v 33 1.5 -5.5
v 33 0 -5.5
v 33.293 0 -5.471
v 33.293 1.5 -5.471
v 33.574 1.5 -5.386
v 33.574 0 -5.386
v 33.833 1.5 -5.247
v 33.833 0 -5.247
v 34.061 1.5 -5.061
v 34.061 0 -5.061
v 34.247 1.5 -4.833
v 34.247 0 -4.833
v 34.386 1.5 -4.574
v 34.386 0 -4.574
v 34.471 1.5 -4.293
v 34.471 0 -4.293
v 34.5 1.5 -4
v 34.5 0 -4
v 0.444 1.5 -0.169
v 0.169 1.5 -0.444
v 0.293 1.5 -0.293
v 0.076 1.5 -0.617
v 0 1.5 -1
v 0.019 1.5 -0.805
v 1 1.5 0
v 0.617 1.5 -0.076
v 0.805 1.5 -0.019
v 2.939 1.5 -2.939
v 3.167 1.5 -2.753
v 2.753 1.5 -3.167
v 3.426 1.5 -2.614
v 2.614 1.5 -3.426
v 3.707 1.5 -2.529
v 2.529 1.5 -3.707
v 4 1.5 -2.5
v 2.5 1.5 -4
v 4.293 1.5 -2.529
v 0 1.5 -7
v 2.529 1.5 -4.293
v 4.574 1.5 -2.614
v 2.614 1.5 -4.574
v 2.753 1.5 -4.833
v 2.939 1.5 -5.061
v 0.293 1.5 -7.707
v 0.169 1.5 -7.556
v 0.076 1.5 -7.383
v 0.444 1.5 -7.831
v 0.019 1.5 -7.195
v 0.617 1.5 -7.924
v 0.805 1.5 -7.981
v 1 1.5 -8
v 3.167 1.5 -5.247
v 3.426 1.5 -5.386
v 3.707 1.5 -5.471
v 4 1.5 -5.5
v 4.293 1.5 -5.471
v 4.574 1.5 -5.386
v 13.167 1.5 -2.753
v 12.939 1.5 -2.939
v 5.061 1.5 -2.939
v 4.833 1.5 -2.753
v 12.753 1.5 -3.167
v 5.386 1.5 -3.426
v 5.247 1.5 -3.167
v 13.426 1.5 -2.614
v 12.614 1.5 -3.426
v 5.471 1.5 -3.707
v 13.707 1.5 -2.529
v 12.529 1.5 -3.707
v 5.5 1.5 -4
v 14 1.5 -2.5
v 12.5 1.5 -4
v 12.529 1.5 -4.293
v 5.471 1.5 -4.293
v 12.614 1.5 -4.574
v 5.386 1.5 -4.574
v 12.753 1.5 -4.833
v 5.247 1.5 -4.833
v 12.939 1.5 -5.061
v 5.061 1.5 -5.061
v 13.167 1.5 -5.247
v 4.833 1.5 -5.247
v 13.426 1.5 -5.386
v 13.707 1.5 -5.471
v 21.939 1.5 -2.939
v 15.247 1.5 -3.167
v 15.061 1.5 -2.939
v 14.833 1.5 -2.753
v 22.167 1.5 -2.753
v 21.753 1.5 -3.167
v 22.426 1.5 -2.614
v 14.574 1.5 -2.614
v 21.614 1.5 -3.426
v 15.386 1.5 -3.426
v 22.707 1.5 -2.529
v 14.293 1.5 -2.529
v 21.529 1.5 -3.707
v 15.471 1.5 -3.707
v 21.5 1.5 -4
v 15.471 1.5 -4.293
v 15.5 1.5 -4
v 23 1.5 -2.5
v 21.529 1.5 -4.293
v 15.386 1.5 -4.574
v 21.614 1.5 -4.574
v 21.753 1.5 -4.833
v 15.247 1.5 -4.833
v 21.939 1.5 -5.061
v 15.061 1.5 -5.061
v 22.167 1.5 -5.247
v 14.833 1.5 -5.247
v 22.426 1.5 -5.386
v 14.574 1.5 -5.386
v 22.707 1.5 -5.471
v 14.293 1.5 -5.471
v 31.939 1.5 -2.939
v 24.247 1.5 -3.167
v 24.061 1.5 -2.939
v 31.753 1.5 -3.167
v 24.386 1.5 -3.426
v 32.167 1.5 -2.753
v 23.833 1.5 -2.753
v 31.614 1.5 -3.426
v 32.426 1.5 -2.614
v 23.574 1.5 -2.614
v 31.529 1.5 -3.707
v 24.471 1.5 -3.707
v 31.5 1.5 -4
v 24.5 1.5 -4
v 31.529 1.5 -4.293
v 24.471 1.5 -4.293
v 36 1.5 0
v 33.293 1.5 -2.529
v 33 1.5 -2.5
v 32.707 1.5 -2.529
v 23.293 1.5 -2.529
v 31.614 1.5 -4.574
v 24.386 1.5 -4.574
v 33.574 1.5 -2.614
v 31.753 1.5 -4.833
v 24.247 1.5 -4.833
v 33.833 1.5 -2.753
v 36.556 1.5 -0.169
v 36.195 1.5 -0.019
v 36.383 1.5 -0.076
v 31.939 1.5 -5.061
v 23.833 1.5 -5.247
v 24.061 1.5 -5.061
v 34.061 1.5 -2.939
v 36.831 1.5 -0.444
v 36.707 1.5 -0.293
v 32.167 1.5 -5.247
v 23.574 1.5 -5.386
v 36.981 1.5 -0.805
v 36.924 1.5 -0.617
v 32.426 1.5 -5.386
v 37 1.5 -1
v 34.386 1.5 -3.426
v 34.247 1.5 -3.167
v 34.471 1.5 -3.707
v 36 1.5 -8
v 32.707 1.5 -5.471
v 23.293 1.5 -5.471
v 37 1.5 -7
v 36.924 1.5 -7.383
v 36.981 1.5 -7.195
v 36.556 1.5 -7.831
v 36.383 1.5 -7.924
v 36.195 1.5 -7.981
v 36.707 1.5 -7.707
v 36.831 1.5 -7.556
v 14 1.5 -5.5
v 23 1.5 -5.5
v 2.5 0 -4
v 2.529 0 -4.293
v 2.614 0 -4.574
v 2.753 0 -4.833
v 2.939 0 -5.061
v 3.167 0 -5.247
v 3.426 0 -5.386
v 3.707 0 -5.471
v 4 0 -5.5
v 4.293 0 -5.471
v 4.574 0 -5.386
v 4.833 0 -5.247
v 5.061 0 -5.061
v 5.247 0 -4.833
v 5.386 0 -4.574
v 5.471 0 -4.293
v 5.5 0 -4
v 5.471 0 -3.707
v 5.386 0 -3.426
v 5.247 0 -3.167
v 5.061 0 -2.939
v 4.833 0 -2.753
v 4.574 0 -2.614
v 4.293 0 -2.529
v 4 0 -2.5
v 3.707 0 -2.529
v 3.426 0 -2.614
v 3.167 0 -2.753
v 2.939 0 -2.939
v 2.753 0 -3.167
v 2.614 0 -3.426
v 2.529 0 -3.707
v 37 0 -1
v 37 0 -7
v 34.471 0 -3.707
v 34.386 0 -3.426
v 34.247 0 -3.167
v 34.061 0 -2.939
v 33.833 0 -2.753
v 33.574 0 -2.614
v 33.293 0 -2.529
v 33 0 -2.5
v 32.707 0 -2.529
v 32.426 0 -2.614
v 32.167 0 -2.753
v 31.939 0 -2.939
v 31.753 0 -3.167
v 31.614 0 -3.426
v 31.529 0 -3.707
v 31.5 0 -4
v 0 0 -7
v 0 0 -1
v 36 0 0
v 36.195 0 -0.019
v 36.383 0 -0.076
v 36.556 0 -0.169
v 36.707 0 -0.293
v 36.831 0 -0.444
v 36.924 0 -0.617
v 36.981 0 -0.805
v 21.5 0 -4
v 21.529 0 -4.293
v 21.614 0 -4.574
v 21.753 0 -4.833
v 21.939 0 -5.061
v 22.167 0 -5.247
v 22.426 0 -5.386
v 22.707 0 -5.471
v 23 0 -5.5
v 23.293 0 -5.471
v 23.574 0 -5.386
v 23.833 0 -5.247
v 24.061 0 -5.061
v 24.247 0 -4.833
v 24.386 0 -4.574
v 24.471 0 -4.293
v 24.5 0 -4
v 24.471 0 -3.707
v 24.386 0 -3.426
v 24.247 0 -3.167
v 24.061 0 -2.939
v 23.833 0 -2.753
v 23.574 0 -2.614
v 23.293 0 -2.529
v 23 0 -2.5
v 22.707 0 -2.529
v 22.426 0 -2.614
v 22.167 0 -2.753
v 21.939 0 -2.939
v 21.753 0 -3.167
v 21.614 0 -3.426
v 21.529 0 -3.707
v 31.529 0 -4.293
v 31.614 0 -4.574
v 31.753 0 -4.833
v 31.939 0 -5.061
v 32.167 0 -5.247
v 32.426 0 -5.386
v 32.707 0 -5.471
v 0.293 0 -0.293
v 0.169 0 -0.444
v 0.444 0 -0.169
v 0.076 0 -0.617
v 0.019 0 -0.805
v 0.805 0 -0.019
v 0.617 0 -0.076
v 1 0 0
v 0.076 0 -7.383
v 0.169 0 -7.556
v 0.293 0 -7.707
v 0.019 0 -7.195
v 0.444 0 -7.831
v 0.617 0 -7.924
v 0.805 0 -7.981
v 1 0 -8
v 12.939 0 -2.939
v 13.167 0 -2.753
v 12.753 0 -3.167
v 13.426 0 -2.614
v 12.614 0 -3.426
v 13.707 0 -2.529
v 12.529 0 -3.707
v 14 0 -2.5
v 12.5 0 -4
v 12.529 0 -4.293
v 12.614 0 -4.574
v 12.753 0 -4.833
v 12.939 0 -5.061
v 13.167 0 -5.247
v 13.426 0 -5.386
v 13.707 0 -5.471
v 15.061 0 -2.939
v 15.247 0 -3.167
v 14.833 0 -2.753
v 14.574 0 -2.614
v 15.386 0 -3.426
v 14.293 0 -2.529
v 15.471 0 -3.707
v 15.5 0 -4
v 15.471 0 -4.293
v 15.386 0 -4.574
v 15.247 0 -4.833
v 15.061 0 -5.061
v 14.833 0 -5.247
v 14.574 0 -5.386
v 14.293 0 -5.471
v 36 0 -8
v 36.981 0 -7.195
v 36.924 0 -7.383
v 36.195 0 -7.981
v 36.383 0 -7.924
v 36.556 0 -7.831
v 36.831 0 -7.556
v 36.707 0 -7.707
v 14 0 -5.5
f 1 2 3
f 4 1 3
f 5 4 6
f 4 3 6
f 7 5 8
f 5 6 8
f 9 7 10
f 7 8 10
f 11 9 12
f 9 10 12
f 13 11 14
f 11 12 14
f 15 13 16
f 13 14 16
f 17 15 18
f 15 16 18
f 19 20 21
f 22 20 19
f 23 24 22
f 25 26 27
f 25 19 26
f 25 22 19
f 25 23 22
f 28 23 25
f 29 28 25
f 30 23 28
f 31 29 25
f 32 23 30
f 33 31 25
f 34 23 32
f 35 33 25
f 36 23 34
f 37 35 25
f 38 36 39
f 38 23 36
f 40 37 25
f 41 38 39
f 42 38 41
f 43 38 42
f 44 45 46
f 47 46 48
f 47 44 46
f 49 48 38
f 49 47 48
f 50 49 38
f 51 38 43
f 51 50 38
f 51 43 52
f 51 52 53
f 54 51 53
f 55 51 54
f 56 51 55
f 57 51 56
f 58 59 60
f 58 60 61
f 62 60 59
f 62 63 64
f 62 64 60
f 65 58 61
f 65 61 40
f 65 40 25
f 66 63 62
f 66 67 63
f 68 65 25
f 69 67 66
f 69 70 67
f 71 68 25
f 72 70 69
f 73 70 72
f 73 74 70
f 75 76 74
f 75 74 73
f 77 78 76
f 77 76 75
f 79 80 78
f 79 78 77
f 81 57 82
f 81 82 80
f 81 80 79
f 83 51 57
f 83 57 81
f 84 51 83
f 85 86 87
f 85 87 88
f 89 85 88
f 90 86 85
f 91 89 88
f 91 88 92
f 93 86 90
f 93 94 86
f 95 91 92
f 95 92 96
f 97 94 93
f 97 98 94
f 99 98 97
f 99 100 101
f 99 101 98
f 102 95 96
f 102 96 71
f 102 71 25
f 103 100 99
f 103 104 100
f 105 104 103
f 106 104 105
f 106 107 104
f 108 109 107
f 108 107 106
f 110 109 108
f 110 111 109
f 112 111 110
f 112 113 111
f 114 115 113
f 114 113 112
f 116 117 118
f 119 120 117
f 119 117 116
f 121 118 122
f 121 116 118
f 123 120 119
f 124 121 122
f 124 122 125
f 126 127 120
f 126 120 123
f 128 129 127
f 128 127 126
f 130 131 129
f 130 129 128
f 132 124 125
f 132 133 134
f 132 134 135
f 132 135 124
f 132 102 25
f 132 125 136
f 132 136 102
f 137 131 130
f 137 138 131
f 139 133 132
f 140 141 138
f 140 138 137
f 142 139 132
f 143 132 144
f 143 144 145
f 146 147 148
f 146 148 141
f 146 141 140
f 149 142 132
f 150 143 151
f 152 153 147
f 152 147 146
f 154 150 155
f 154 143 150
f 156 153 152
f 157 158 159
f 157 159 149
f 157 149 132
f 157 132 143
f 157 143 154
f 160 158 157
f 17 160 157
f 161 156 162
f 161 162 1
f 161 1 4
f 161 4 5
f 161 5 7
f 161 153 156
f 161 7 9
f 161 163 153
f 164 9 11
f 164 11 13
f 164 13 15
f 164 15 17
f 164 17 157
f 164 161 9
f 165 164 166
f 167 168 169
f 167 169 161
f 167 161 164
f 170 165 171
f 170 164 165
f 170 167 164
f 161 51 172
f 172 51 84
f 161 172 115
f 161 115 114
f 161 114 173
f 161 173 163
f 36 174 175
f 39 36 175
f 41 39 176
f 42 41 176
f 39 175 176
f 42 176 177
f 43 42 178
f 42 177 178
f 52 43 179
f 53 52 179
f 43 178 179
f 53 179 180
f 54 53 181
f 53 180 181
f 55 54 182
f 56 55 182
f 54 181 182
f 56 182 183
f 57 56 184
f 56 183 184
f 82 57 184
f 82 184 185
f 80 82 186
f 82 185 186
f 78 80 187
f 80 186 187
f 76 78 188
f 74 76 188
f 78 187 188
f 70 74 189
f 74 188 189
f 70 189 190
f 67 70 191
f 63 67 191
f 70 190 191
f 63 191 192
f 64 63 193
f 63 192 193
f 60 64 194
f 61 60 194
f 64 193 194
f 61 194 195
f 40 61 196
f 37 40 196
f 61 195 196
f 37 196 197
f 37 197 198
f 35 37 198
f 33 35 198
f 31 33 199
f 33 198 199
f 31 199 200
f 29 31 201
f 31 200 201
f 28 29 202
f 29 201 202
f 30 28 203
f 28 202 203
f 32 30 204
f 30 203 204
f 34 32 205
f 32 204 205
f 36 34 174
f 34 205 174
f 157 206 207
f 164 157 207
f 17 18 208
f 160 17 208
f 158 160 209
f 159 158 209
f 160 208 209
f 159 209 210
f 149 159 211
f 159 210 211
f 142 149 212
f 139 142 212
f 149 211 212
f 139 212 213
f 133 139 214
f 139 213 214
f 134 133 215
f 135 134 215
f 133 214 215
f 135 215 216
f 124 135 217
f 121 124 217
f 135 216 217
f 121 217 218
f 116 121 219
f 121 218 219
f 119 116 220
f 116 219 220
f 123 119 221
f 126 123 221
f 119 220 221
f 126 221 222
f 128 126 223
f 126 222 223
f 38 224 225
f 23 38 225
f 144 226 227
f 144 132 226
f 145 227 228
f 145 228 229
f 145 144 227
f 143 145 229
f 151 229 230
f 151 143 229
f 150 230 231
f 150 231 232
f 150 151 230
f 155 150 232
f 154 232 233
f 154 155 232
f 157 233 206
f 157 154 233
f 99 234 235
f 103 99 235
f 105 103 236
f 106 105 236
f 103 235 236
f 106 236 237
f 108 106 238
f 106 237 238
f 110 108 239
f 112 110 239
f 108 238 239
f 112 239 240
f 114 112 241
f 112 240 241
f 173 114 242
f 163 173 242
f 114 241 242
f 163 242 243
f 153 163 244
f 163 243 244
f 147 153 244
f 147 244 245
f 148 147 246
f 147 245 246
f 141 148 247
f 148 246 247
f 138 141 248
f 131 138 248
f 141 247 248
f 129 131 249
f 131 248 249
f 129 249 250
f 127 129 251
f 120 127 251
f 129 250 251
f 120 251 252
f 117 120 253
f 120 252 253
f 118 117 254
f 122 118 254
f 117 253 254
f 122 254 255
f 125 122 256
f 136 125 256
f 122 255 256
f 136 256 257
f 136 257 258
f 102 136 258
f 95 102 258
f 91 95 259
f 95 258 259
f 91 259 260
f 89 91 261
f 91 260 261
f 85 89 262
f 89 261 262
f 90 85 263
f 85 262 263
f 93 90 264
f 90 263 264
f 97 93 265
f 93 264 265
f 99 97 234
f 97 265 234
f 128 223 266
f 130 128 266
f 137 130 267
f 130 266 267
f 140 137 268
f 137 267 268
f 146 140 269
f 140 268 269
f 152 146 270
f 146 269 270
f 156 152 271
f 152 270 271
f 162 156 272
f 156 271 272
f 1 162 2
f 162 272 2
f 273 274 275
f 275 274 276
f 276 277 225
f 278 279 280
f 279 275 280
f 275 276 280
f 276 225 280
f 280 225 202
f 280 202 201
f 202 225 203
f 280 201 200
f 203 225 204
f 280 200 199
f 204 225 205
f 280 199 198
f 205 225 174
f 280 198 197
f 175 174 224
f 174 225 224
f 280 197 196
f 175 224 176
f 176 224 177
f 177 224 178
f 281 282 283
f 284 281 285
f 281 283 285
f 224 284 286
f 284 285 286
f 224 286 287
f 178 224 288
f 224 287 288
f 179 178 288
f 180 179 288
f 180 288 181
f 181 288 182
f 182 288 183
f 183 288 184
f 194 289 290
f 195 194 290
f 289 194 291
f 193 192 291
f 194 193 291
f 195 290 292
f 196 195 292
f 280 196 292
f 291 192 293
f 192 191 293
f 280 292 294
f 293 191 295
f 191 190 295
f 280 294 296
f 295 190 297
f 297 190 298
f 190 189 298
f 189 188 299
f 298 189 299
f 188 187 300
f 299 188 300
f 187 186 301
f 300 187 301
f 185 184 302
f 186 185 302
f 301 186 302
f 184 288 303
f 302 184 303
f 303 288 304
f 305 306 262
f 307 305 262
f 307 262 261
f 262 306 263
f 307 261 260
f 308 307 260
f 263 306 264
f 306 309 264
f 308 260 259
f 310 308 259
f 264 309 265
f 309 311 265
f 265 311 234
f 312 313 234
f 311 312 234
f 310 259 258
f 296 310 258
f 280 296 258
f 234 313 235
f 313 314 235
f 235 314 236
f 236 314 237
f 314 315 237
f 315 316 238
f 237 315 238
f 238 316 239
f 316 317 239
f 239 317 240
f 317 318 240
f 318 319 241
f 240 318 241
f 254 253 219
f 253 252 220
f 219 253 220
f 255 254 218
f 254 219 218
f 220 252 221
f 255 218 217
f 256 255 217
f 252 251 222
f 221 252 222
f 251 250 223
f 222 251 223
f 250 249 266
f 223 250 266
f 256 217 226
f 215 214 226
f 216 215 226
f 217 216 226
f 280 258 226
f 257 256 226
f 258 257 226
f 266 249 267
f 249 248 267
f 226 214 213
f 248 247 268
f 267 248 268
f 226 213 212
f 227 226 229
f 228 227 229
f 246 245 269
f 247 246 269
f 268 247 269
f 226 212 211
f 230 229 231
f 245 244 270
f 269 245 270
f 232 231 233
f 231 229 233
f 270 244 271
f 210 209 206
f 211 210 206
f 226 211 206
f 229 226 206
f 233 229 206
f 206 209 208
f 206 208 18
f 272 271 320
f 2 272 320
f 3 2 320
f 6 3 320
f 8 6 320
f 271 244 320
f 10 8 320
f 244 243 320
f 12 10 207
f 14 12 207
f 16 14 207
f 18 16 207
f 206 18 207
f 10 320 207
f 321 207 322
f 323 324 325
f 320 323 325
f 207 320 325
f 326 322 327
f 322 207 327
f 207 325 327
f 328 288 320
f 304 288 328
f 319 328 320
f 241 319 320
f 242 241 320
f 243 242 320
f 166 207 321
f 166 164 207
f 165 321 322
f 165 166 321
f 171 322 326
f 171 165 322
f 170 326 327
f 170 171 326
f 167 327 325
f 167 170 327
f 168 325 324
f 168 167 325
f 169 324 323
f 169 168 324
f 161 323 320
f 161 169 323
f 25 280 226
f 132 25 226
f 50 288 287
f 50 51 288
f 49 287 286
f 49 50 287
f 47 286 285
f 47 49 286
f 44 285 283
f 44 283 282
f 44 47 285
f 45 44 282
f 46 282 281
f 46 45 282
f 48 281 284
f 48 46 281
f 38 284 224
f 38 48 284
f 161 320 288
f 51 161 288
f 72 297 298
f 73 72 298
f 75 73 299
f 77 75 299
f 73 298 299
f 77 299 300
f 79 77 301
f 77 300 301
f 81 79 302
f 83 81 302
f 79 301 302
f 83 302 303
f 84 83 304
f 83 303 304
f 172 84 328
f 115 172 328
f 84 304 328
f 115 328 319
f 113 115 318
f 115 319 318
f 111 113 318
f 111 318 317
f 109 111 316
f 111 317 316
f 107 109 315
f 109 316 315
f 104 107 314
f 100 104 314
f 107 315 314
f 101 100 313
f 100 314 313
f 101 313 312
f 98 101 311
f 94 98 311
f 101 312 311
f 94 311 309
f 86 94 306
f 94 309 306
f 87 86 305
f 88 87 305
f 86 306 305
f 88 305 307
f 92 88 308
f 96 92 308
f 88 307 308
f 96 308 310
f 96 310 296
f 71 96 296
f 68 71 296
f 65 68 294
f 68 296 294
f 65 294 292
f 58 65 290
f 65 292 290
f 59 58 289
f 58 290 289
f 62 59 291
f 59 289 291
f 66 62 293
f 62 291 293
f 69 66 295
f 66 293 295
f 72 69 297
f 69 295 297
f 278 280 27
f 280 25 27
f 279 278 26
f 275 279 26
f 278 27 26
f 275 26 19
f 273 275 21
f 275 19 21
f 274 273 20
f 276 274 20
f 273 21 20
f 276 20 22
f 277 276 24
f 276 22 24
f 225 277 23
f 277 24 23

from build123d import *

# Parameters (mm, degrees)
BOSS_EXTRUDE1_DEPTH = 1.5
FILLET1_R           = 1


with BuildPart() as part:
    # Sketch1 → Boss-Extrude1 (new body)
    with BuildSketch(Plane(origin=(0, 0, 0), x_dir=(1, 0, 0), z_dir=(0, 1, 0))):
        with BuildLine():
            Line((18.5, 0), (18.5, 4))
            Line((18.5, 4), (15.5, 4))
            ThreePointArc((15.5, 4), (14, 2.5), (12.5, 4))
            Line((12.5, 4), (5.5, 4))
            ThreePointArc((5.5, 4), (4, 2.5), (2.5, 4))
            Line((2.5, 4), (0, 4))
            Line((0, 4), (0, 0))
            Line((0, 0), (18.5, 0))
        make_face()
        with BuildLine():
            Line((21.5, 4), (18.5, 4))
            Line((18.5, 4), (18.5, 0))
            Line((18.5, 0), (37, 0))
            Line((37, 0), (37, 4))
            Line((37, 4), (34.5, 4))
            ThreePointArc((34.5, 4), (33, 2.5), (31.5, 4))
            Line((31.5, 4), (24.5, 4))
            ThreePointArc((24.5, 4), (23, 2.5), (21.5, 4))
        make_face()
        with BuildLine():
            Line((18.5, 4), (18.5, 8))
            Line((18.5, 8), (0, 8))
            Line((0, 8), (0, 4))
            Line((0, 4), (2.5, 4))
            ThreePointArc((2.5, 4), (4, 5.5), (5.5, 4))
            Line((5.5, 4), (12.5, 4))
            ThreePointArc((12.5, 4), (14, 5.5), (15.5, 4))
            Line((15.5, 4), (18.5, 4))
        make_face()
        with BuildLine():
            Line((33, 8), (18.5, 8))
            Line((18.5, 8), (18.5, 4))
            Line((18.5, 4), (21.5, 4))
            ThreePointArc((21.5, 4), (23, 5.5), (24.5, 4))
            Line((24.5, 4), (31.5, 4))
            ThreePointArc((31.5, 4), (31.939339828, 5.060660172), (33, 5.5))
            Line((33, 5.5), (33, 8))
        make_face()
        with BuildLine():
            Line((37, 8), (33, 8))
            Line((33, 8), (33, 5.5))
            ThreePointArc((33, 5.5), (34.060660172, 5.060660172), (34.5, 4))
            Line((34.5, 4), (37, 4))
            Line((37, 4), (37, 8))
        make_face()
    extrude(amount=BOSS_EXTRUDE1_DEPTH)

    # Fillet1
    fillet1_edges = [part.edges().sort_by_distance(p)[0] for p in [
        (0, 0.75, 0),
        (0, 0.75, -8),
        (37, 0.75, -8),
        (37, 0.75, 0),
    ]]
    fillet(fillet1_edges, radius=FILLET1_R)


solid = part.part
